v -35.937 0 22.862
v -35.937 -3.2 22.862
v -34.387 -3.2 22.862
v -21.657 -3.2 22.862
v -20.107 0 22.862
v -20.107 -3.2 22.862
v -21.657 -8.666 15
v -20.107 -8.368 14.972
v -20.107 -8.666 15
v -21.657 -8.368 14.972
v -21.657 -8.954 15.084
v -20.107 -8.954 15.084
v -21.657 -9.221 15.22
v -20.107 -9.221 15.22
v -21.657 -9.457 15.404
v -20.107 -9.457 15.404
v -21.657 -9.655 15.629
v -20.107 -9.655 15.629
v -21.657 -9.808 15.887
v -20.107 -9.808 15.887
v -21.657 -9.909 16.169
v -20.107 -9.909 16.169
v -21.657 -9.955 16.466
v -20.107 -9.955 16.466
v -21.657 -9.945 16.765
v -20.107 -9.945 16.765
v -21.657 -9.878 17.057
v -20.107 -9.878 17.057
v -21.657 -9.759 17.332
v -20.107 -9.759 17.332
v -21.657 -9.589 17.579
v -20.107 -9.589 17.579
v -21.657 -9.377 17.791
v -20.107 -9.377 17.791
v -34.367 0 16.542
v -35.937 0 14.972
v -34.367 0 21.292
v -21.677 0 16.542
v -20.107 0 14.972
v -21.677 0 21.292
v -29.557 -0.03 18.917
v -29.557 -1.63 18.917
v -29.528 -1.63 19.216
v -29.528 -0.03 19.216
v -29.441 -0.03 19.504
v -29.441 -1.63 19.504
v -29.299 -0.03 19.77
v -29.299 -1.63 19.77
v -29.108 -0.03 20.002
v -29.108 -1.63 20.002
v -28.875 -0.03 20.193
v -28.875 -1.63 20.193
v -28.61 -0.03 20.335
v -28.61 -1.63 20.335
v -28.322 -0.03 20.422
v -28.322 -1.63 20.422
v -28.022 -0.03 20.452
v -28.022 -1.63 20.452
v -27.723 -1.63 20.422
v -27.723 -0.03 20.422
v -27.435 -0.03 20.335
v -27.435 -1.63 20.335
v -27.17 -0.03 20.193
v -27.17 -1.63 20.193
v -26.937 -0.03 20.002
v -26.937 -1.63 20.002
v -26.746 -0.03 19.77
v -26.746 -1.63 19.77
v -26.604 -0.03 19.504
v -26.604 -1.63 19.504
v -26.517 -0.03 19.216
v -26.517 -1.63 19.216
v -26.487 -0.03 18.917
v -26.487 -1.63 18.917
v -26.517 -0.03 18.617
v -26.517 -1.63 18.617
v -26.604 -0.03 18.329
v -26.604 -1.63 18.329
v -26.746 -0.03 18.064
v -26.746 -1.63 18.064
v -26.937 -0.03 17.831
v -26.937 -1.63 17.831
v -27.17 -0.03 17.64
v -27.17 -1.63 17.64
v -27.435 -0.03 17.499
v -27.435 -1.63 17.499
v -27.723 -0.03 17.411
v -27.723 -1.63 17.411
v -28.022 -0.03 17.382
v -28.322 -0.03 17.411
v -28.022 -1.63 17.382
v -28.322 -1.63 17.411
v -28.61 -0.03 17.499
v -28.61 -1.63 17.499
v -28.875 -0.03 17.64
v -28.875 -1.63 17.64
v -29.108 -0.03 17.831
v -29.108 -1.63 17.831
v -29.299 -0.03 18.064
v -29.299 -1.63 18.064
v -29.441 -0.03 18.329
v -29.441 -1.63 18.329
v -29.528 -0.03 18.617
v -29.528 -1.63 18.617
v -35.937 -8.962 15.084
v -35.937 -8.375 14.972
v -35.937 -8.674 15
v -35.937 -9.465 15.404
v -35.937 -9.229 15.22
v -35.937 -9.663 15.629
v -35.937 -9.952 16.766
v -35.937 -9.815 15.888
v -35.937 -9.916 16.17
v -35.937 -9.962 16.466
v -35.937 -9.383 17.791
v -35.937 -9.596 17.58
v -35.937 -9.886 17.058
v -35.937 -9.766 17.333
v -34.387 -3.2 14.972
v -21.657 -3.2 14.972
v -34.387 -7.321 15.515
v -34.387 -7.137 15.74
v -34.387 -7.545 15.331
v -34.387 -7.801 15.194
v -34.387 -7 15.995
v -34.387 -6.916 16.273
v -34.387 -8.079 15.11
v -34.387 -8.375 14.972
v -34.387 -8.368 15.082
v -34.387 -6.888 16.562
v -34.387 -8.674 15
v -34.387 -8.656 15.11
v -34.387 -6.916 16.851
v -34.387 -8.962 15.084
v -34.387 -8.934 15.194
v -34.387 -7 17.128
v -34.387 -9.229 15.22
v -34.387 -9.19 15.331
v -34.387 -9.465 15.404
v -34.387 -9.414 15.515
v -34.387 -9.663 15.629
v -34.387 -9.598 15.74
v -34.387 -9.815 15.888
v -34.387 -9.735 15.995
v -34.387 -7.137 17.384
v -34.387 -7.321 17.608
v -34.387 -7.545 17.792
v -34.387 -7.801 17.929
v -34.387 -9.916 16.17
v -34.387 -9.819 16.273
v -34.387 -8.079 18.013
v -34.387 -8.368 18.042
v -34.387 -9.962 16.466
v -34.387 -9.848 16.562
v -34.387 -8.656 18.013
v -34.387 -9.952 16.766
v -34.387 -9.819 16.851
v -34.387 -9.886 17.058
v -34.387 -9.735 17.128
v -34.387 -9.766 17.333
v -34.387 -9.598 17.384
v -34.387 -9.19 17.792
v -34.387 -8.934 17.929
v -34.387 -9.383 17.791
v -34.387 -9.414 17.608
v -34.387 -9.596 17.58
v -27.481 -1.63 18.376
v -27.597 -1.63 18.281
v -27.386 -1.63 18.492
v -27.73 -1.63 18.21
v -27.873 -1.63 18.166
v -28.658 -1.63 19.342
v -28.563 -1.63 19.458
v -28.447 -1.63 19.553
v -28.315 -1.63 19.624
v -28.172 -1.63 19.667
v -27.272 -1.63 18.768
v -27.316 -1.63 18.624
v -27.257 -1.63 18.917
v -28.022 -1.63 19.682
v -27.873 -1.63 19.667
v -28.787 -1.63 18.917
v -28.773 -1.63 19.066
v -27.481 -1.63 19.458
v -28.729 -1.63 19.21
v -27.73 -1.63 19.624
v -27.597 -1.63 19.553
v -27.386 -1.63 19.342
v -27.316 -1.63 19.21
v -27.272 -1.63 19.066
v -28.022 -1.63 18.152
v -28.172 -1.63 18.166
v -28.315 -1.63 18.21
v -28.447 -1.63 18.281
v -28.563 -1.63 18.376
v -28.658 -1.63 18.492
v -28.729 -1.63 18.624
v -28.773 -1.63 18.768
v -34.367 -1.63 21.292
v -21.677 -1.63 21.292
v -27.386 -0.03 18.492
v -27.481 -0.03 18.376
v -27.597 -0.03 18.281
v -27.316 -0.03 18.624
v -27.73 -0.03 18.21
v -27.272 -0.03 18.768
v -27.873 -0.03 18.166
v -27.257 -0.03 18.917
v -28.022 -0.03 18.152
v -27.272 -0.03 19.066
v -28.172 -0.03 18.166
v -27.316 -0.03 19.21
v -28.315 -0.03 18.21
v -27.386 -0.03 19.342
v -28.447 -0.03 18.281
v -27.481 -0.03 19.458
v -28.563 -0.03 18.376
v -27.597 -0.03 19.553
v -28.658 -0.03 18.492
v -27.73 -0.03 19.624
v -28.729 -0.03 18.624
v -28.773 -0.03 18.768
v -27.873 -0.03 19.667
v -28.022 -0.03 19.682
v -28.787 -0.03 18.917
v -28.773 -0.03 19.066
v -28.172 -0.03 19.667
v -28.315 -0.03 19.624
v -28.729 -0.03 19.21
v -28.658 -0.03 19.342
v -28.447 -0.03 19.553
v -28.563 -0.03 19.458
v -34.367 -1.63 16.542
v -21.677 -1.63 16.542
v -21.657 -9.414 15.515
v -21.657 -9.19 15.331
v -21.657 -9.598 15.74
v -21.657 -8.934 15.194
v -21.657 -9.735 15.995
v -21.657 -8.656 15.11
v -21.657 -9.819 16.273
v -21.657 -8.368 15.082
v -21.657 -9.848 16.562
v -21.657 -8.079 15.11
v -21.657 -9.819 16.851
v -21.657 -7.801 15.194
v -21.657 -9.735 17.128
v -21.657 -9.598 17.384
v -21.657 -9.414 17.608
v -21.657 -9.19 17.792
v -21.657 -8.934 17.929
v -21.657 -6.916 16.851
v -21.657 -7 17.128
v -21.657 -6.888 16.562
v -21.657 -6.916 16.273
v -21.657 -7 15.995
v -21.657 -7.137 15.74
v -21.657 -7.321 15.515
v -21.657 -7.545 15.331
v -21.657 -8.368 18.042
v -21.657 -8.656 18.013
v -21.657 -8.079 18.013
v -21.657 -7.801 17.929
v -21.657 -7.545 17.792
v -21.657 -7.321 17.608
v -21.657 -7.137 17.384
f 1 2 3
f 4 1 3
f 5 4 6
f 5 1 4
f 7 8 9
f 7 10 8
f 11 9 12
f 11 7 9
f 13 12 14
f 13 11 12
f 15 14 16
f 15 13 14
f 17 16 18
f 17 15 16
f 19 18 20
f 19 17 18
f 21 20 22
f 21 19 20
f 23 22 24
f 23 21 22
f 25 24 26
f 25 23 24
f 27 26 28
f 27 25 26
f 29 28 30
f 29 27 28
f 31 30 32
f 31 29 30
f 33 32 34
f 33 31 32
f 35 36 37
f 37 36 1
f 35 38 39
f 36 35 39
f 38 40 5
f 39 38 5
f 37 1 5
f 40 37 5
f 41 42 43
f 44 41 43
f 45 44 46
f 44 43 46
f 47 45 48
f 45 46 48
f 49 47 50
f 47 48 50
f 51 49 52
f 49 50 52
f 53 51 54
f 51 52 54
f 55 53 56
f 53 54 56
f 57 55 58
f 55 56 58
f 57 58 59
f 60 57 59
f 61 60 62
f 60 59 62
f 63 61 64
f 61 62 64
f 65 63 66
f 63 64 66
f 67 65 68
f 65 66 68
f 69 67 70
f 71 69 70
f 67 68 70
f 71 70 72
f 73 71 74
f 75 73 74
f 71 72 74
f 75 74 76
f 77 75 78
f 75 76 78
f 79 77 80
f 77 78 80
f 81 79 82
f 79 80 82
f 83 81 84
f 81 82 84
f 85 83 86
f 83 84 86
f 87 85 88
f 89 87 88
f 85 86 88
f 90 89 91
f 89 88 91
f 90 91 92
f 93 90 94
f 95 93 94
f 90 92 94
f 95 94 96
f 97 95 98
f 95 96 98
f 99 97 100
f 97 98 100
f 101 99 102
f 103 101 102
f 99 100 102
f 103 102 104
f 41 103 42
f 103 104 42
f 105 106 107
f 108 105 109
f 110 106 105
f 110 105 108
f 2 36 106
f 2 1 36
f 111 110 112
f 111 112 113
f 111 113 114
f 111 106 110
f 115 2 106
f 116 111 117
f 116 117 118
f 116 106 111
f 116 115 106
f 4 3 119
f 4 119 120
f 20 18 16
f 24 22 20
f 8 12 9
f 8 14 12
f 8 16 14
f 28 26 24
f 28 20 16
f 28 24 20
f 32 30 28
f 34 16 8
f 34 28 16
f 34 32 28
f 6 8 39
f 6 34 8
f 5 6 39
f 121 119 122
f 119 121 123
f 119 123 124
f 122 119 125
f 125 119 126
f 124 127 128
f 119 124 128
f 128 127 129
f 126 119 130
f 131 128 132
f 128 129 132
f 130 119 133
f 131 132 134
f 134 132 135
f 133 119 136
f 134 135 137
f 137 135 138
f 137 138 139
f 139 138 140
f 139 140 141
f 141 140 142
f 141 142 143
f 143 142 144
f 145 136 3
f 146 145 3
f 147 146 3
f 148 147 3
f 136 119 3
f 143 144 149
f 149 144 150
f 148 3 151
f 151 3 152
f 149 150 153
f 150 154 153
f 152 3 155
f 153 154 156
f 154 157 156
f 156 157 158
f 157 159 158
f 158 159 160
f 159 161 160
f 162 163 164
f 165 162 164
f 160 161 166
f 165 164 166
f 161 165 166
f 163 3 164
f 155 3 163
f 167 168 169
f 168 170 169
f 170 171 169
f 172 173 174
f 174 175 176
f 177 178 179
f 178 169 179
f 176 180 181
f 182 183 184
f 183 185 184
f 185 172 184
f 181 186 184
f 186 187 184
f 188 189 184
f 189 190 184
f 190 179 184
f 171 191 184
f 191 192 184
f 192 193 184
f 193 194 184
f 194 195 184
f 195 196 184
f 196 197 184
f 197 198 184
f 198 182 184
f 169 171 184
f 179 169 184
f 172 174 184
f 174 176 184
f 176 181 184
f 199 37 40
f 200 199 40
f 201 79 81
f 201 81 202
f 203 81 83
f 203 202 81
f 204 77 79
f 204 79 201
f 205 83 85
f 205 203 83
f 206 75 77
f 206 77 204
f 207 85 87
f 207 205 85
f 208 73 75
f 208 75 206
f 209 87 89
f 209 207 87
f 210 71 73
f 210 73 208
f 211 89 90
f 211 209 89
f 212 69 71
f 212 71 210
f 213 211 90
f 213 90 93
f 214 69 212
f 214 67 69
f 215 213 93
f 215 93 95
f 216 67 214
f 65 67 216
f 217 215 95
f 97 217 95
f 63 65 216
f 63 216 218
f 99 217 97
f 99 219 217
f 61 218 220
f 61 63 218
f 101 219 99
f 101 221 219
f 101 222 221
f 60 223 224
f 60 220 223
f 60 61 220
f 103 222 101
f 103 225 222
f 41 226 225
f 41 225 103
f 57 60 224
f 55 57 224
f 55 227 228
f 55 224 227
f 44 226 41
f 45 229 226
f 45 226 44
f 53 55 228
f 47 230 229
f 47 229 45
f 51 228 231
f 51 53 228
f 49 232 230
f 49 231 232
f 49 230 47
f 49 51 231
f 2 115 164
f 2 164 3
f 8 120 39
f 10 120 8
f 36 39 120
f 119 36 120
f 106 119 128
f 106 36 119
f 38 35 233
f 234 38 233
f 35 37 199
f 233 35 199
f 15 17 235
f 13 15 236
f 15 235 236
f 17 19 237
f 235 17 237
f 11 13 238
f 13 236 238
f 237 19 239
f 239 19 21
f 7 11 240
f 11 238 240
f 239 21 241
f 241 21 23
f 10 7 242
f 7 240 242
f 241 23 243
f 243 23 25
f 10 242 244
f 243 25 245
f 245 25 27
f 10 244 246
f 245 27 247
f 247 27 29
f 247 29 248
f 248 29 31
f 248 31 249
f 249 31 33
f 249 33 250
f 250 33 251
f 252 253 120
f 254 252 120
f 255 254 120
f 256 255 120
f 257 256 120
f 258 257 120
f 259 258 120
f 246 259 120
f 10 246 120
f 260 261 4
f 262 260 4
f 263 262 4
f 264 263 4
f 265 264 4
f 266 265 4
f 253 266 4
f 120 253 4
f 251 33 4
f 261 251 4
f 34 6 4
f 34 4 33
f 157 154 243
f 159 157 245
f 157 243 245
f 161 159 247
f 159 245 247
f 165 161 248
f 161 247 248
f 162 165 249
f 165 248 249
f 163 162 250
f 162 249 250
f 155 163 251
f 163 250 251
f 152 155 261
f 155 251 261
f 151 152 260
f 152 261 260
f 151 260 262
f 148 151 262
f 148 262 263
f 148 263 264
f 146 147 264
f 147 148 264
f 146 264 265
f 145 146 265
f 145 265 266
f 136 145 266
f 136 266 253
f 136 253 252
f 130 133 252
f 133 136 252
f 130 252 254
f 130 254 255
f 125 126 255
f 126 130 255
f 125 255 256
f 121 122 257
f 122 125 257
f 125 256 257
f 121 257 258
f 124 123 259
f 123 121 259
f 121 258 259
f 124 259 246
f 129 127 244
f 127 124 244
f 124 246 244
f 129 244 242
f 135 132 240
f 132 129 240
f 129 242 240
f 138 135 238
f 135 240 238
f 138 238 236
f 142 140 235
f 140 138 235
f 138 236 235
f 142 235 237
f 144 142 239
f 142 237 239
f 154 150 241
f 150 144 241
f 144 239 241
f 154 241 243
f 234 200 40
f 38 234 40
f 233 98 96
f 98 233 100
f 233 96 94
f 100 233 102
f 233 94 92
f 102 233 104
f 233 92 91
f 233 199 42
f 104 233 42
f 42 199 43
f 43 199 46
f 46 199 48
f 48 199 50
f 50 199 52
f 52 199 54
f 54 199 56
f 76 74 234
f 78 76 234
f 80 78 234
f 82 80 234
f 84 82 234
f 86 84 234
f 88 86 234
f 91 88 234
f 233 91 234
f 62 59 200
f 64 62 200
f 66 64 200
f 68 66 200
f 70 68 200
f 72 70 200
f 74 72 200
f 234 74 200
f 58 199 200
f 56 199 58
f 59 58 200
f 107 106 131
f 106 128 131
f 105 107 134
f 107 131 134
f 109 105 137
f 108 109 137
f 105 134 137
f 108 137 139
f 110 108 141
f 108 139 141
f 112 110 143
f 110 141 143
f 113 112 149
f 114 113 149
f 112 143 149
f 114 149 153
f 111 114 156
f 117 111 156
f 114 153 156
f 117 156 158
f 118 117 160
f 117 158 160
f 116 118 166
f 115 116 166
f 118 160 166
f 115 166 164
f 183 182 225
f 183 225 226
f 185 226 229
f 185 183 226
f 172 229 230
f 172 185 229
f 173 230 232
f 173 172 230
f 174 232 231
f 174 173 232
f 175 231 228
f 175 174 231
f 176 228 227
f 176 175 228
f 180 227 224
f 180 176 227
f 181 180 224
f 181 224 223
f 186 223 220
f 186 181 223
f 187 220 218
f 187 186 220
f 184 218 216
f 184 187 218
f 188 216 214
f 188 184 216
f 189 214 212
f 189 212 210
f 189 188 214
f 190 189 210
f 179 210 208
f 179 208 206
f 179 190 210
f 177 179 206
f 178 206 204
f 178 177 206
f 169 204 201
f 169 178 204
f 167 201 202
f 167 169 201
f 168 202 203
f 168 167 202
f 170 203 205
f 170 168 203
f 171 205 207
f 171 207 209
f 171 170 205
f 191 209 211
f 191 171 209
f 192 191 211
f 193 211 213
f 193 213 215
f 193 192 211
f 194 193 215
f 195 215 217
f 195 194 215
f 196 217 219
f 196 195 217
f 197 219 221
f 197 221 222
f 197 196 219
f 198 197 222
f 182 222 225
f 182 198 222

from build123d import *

# Parameters (mm, degrees)
F0_W      = 15.83
F0_H      = 7.89
F1_DEPTH  = 3.2
F3_DEPTH  = 1.55
F4_R      = 1.59
F6_DEPTH  = 1.55
F7_R      = 1.59
F8_DEPTH  = 1.55
F9_R      = 1.48
F10_DEPTH = 12.83
F11_T     = -1.57
F12_R     = 1.535
F12_R_2   = 0.765
F13_DEPTH = 1.6


with BuildPart() as f1:
    # F0 (on Front) → F1 (new body)
    with BuildSketch(Plane.XZ):
        with Locations((-28.0223558657, 18.9167669917)):
            Rectangle(F0_W, F0_H)
    extrude(amount=F1_DEPTH)

    # F2 (on face) → F3 (join)
    with BuildSketch(Plane.YZ.offset(-20.1073558657)):
        Polygon((-12.81, 14.9717669917), (-3.2, 14.9717669917), (-3.2, 22.8617669917), align=None)
    extrude(amount=-F3_DEPTH)

    # F4
    f4_edges = [f1.edges().sort_by_distance(p)[0] for p in [
        (-20.882356, -12.81, 14.971767),
    ]]
    fillet(f4_edges, radius=F4_R)

    # F5 (on face) → F6 (join)
    with BuildSketch(Plane(origin=(-35.9373558657, 0, 0), x_dir=(0, -1, 0), z_dir=(-1, 0, 0))):
        Polygon((3.2, 22.8617669917), (3.2, 14.9717669917), (12.8218363971, 14.9717669917), align=None)
    extrude(amount=-F6_DEPTH)

    # F7
    f7_edges = [f1.edges().sort_by_distance(p)[0] for p in [
        (-35.162356, -12.821836, 14.971767),
    ]]
    fillet(f7_edges, radius=F7_R)


with BuildPart() as f8:
    # F8 (new): a face of the model
    f8_faces = [f1.part.faces().sort_by_distance(p)[0] for p in [
        (-35.9373558657, -4.069759588, 18.2879557139),
    ]]
    extrude(f8_faces, amount=-F8_DEPTH)


with BuildPart() as f1_1:
    add(f1.part)

    add(f8.part)  # F10 merges F8
    # F9 (on face) → F10 (join)
    with BuildSketch(Plane(origin=(-21.6573558657, 0, 0), x_dir=(0, -1, 0), z_dir=(-1, 0, 0))):
        with Locations((8.367674268, 16.5617669917)):
            Circle(F9_R)
    extrude(amount=F10_DEPTH)

    # F11
    f11_openings = [f1_1.faces().sort_by_distance(p)[0] for p in [
        (-28.022356, 0, 18.916767),
    ]]
    offset(amount=F11_T, openings=f11_openings)

    # F12 (on face) → F13 (join)
    with BuildSketch(Plane(origin=(0, -1.63, 0), x_dir=(-1, 0, 0), z_dir=(0, 1, 0))):
        with Locations((28.0223558657, 18.9167669917)):
            Circle(F12_R)
        with Locations((28.0223558657, 18.9167669917)):
            Circle(F12_R_2, mode=Mode.SUBTRACT)
    extrude(amount=F13_DEPTH)


solid = f1_1.part
